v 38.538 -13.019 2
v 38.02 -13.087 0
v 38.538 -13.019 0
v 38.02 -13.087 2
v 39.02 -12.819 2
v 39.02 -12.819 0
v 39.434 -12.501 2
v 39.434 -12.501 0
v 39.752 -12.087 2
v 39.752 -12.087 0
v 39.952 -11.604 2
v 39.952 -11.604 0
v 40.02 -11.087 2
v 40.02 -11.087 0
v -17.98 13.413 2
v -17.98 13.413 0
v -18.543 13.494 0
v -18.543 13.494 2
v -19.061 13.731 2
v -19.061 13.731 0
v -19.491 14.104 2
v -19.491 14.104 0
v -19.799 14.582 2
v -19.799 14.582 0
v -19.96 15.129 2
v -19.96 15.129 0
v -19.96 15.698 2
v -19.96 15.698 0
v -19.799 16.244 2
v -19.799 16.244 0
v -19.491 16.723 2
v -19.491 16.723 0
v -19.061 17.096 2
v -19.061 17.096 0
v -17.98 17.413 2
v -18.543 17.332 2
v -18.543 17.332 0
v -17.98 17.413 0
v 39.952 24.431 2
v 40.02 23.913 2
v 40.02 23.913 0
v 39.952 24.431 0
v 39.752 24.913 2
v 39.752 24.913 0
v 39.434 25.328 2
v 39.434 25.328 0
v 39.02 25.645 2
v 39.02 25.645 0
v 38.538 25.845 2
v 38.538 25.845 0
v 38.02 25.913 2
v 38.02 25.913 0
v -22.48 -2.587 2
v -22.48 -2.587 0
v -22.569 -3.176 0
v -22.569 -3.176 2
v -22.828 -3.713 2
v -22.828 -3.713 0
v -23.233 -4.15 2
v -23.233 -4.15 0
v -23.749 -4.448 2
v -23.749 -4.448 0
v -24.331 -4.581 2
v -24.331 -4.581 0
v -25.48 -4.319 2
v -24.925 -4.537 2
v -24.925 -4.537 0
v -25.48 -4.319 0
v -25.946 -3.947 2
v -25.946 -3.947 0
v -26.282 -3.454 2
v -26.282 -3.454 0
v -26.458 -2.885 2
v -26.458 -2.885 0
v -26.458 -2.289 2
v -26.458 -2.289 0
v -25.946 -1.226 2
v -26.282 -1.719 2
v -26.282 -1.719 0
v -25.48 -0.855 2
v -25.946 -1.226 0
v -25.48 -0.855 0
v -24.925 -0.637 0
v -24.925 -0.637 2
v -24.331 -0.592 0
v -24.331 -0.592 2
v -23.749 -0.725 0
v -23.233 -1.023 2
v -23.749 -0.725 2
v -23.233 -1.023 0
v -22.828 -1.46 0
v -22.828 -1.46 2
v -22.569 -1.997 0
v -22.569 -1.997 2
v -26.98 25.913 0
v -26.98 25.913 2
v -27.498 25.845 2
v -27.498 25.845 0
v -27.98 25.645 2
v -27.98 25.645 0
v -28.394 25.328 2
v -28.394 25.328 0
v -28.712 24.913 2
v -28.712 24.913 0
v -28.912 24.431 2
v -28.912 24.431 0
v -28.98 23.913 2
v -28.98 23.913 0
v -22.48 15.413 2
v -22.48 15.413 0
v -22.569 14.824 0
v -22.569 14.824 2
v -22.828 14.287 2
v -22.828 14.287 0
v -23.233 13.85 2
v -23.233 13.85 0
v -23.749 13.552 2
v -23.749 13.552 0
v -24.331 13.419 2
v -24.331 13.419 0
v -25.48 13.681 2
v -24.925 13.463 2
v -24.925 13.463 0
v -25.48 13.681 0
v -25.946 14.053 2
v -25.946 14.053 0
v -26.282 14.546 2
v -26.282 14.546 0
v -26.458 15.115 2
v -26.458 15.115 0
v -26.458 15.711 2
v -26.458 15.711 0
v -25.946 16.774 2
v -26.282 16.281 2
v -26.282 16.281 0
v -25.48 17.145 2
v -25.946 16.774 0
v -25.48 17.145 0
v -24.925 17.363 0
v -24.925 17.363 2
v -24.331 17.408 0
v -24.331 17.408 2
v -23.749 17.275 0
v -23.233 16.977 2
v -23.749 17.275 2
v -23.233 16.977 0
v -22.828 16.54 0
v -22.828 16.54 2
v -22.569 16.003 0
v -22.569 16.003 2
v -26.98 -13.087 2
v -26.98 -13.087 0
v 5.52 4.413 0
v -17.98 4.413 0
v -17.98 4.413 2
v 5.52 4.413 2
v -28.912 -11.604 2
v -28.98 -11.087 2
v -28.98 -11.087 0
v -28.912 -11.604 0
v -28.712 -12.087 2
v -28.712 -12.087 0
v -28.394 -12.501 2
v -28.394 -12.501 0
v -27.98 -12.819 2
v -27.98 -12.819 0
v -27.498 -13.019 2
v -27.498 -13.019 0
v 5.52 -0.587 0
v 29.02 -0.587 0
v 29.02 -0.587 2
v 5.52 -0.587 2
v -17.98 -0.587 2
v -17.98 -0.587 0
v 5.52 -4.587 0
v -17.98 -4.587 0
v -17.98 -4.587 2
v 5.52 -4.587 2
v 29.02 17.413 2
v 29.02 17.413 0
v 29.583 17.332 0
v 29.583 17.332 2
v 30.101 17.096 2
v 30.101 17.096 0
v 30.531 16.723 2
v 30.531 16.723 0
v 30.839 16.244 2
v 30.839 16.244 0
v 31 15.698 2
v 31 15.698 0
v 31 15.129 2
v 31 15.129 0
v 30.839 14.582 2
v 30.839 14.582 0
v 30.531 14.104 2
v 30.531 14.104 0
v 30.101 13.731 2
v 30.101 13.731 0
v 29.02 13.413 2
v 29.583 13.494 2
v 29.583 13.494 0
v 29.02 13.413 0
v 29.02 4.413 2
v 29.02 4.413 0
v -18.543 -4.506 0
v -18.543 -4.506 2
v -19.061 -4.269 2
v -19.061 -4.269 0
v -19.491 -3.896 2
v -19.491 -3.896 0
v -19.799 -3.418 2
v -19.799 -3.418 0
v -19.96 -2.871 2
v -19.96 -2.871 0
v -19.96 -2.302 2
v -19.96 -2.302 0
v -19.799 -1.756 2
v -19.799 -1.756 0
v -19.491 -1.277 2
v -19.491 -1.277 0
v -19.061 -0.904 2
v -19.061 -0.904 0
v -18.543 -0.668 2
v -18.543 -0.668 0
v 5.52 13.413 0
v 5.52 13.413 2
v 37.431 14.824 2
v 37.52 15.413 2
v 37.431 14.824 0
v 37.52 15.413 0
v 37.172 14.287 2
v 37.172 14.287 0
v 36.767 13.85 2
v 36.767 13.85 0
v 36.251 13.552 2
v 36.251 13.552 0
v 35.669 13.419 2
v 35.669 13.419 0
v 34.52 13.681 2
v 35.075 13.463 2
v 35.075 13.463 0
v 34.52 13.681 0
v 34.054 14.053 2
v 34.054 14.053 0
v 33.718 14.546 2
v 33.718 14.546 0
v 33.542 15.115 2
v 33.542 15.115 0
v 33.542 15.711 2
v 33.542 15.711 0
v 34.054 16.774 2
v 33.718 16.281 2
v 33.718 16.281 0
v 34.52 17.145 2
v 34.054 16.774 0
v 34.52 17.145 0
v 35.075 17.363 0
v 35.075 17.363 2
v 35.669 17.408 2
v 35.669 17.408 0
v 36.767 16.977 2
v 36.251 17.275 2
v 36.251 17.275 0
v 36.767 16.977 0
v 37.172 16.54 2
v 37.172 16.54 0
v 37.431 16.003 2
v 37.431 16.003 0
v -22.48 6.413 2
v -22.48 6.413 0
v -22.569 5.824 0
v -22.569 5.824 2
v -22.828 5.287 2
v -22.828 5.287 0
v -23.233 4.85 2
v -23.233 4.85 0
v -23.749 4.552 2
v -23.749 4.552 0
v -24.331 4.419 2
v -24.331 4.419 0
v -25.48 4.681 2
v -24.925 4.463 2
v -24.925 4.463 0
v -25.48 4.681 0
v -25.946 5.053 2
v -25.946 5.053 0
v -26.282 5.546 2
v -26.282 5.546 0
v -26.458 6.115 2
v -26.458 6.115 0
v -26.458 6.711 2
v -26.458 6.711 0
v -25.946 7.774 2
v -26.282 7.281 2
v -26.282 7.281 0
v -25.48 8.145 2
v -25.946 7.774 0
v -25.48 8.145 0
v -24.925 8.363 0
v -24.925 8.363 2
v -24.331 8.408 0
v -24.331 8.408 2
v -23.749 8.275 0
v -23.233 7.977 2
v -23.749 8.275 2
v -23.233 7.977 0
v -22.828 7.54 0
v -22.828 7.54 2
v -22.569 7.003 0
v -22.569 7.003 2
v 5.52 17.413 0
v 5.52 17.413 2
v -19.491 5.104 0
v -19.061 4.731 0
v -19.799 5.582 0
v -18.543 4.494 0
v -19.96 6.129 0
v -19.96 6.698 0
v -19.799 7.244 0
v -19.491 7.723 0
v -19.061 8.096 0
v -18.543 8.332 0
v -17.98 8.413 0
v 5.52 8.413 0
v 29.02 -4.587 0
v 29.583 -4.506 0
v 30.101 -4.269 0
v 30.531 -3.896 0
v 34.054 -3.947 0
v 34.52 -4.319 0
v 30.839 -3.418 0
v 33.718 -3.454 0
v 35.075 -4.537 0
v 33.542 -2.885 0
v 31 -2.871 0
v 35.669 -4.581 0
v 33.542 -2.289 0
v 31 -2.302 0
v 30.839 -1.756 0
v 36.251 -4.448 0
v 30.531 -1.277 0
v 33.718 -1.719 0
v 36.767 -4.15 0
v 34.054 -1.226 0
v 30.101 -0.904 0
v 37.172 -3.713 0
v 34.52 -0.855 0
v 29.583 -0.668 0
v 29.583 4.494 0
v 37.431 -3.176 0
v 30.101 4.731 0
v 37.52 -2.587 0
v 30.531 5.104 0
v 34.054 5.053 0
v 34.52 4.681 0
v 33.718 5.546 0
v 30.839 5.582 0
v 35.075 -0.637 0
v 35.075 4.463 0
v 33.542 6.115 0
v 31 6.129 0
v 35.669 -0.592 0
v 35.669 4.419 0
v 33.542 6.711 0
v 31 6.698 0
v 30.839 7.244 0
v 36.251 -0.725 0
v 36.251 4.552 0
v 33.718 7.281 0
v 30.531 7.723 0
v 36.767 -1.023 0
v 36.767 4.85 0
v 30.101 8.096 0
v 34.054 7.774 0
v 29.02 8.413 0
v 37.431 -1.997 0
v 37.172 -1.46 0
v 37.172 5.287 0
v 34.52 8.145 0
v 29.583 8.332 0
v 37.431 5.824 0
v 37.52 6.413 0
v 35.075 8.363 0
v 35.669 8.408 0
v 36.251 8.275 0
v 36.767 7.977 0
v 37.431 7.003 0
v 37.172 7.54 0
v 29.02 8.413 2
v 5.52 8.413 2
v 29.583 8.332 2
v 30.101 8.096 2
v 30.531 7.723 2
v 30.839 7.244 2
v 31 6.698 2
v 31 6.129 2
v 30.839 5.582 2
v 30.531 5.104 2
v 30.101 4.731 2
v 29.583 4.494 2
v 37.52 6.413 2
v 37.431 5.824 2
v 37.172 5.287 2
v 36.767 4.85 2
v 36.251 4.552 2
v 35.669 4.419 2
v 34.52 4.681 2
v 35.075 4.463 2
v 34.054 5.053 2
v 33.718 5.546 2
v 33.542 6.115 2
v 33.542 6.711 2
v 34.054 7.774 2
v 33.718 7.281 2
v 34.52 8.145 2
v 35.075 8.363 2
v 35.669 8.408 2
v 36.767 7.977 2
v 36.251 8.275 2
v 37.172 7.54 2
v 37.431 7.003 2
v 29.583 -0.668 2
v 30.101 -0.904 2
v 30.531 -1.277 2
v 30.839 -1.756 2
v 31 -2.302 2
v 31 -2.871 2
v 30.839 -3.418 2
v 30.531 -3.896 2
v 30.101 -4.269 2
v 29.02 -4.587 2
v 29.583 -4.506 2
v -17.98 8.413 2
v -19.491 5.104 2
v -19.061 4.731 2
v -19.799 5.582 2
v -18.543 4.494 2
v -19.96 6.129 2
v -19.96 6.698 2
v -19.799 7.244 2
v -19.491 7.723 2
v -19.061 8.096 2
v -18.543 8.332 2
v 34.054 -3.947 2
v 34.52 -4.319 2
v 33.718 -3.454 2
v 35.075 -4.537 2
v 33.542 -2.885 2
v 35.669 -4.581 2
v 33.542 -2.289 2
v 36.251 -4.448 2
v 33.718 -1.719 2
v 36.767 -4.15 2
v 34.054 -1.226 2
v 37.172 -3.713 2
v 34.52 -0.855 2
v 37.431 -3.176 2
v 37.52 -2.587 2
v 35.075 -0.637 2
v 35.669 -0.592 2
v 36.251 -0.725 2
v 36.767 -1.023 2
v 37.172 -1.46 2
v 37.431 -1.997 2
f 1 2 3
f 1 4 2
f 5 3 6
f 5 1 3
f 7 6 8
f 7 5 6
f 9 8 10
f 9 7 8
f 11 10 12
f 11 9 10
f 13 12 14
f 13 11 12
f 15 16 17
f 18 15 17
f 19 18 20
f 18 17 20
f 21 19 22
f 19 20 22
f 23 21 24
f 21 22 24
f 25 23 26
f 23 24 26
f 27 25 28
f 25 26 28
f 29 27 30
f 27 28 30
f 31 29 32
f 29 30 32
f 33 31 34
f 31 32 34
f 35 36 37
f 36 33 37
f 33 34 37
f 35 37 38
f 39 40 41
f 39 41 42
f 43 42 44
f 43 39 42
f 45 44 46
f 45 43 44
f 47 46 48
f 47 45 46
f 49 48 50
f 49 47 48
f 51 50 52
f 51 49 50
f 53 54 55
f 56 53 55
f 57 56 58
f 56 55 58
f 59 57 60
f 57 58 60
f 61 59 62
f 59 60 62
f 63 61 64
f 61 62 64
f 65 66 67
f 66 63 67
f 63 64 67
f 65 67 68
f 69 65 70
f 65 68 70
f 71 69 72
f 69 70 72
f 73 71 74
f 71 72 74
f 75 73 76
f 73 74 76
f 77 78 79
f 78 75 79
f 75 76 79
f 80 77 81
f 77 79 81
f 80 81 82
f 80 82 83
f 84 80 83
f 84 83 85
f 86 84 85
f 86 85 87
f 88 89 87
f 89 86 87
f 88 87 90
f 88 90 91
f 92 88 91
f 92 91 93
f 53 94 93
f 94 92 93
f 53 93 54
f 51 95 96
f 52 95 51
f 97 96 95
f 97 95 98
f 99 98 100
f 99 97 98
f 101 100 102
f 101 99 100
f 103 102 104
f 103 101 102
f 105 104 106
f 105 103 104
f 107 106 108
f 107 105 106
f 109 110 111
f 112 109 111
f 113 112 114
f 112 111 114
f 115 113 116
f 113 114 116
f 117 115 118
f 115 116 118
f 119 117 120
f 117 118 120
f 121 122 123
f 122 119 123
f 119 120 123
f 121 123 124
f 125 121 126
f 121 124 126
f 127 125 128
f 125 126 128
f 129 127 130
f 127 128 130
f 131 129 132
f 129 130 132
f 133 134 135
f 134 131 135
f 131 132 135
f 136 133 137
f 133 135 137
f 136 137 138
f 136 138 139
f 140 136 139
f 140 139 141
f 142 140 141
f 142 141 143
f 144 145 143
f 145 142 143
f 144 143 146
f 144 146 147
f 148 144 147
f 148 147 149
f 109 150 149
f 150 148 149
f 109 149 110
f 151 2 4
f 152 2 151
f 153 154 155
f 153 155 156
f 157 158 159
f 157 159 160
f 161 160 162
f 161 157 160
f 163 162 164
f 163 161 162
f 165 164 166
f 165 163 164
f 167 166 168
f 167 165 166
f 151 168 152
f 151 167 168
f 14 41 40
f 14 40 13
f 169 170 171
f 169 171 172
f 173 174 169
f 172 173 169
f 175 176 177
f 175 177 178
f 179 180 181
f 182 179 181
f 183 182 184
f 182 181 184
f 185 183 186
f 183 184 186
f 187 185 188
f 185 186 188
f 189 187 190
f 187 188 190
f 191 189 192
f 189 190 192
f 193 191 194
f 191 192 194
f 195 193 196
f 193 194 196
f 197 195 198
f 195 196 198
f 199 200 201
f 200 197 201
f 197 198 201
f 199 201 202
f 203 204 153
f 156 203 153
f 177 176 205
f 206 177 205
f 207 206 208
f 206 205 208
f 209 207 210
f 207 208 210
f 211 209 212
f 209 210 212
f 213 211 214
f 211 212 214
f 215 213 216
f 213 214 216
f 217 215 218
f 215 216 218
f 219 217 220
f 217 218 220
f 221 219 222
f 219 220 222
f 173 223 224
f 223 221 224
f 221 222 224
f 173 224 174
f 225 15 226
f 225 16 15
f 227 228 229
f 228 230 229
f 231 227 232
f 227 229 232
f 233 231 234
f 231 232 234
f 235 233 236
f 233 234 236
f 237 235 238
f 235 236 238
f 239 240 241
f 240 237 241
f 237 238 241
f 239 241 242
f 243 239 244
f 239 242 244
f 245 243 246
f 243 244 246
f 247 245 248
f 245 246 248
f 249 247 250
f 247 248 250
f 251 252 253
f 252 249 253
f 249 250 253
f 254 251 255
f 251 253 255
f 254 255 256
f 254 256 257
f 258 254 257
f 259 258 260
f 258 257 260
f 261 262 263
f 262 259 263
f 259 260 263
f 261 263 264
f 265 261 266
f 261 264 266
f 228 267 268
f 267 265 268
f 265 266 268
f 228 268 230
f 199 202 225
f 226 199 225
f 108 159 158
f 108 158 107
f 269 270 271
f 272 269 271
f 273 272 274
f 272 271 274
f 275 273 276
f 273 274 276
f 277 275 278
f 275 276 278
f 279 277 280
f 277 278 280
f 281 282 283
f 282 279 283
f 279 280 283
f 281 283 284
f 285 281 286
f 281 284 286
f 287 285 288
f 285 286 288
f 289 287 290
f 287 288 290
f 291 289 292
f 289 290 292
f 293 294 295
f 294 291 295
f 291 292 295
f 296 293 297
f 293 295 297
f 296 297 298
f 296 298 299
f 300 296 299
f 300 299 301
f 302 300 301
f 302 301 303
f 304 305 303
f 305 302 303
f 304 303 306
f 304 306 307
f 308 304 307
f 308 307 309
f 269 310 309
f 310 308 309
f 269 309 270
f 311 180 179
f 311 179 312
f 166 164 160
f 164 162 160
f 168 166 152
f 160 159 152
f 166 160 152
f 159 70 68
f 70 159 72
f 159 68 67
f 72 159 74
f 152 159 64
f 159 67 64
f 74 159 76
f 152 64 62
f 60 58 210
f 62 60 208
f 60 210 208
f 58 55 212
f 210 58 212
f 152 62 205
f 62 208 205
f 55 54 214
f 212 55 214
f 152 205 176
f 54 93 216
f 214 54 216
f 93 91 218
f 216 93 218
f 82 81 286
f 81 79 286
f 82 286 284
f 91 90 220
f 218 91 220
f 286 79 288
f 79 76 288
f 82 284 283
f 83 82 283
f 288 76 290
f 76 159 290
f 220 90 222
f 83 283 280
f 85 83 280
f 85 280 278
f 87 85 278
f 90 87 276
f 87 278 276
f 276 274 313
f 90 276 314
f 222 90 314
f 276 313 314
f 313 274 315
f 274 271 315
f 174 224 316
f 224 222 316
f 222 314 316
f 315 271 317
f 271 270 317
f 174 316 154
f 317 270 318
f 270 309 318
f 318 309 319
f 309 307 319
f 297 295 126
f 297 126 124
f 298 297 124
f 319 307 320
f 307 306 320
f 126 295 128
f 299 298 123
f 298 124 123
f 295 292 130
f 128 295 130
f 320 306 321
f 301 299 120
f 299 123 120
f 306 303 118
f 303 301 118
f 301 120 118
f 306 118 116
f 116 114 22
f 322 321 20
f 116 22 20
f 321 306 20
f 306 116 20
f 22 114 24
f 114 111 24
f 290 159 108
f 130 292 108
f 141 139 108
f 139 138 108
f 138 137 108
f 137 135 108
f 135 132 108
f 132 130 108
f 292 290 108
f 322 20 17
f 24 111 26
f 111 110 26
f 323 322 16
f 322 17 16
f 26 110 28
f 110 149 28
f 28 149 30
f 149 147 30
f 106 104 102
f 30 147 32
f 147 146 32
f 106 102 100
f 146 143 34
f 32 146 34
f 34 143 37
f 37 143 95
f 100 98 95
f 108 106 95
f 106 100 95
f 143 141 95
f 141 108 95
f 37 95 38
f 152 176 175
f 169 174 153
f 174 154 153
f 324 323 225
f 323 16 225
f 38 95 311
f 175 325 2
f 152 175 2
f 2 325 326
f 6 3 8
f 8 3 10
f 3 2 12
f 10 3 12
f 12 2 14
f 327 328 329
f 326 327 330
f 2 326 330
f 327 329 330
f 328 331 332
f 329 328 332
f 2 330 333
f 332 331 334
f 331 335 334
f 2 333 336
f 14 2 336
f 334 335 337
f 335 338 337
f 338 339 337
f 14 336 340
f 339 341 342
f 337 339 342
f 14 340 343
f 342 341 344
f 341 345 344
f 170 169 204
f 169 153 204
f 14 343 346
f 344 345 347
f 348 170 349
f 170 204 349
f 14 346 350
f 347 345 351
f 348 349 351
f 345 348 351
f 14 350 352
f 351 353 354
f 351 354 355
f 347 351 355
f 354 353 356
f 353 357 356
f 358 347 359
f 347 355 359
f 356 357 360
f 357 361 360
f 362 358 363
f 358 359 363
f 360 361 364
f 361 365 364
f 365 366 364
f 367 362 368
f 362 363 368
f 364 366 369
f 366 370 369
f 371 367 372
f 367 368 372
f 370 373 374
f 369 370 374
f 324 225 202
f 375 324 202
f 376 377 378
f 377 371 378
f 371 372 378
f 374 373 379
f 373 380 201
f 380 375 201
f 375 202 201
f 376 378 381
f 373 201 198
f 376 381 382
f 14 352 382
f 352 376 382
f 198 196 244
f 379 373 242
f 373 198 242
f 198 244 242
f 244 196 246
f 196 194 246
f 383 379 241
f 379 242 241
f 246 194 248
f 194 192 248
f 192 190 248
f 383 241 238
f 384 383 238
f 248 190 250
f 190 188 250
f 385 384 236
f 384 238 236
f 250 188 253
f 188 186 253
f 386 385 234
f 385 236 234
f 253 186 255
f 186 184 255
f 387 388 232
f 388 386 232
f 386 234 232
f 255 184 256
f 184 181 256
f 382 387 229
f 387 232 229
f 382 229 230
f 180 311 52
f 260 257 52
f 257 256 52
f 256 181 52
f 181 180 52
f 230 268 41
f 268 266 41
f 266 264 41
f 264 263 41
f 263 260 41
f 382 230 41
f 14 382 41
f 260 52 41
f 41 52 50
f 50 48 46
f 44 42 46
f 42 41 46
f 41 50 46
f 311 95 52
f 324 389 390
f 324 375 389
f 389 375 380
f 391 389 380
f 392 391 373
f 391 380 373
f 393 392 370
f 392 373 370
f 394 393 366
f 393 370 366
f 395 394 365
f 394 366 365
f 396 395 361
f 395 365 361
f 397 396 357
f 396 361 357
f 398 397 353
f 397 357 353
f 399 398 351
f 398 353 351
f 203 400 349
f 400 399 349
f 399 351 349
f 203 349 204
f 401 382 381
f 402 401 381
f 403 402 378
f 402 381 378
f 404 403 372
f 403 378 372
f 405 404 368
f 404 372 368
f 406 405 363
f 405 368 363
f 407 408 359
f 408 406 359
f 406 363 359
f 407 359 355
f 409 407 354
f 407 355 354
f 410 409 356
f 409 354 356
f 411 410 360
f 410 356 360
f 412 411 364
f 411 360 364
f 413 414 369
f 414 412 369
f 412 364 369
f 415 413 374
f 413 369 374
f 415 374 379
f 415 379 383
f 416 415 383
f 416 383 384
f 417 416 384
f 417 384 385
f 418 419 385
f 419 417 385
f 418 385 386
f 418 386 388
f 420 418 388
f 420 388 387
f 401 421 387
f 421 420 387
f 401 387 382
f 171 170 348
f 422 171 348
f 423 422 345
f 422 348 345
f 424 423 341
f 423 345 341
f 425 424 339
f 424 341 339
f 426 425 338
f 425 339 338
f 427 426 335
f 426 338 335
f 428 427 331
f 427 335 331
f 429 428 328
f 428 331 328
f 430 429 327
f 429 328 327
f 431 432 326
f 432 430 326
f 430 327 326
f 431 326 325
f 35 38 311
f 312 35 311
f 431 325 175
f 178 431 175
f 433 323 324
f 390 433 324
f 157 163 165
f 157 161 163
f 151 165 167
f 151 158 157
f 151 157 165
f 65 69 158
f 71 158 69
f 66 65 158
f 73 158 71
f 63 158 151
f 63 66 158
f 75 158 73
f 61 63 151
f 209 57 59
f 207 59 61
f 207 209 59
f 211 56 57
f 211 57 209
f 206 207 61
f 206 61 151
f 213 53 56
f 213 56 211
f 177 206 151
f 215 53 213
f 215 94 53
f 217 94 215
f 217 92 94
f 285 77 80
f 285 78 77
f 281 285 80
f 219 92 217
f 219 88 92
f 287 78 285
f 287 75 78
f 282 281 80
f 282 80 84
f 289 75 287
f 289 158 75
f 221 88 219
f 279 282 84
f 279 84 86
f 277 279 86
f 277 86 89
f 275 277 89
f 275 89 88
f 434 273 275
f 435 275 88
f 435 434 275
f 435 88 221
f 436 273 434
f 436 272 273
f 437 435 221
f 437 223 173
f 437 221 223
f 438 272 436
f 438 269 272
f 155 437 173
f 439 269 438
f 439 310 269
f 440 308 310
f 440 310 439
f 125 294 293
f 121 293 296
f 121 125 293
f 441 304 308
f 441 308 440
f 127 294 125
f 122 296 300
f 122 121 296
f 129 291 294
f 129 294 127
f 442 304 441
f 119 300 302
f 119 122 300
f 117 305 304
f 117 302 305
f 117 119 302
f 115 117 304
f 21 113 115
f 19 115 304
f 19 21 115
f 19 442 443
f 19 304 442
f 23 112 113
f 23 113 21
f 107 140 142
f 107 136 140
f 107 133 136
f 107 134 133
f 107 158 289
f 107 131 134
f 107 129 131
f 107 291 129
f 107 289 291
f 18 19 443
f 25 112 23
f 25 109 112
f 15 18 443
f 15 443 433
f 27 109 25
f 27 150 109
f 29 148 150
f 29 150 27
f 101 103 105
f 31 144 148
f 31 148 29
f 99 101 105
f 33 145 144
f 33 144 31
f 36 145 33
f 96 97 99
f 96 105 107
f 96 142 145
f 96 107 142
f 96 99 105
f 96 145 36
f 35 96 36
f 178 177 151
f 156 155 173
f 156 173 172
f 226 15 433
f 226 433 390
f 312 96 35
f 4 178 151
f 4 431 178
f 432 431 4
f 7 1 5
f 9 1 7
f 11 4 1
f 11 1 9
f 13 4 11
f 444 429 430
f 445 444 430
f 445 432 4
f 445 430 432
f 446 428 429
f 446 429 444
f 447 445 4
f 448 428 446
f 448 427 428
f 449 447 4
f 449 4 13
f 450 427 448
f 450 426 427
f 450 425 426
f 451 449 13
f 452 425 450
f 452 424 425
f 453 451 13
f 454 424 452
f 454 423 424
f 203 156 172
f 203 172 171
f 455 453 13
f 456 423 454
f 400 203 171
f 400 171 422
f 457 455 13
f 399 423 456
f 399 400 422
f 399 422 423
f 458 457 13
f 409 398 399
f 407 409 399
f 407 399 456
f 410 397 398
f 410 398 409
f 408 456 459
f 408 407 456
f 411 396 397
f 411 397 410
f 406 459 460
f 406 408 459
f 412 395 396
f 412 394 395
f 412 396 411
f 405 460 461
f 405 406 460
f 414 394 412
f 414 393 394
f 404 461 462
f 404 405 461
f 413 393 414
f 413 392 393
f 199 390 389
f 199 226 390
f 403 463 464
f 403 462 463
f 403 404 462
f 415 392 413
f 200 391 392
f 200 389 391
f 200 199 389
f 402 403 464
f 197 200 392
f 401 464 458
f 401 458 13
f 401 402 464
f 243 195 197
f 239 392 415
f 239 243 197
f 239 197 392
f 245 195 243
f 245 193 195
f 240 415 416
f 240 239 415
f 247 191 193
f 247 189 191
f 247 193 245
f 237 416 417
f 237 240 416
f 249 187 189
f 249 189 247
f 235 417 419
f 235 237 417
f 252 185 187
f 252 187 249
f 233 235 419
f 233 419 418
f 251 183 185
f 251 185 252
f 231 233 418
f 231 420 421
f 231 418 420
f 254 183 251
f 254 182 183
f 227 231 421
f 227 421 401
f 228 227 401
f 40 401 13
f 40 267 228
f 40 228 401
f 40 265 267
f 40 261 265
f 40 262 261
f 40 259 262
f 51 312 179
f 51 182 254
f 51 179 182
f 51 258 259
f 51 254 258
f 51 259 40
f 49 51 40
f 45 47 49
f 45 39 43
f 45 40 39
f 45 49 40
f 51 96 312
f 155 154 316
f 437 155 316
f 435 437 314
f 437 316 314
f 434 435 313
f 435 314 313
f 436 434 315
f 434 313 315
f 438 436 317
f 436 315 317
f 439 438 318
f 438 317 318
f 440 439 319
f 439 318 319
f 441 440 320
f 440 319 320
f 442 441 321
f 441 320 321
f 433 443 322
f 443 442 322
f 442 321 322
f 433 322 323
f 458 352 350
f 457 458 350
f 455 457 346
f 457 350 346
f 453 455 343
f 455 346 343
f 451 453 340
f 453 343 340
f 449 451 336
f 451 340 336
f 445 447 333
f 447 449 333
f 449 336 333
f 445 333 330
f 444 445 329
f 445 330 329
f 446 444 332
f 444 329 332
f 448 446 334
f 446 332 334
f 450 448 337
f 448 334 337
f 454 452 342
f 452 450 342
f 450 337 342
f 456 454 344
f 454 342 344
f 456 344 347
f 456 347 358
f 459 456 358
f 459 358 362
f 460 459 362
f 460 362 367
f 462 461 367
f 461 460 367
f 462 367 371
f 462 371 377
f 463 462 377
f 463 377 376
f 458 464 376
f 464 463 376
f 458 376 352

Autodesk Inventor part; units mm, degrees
ref_plane "YZ Plane" through (0, 0, 0) normal (1, 0, 0) x (0, 1, 0)
ref_plane "XZ Plane" through (0, 0, 0) normal (0, 1, 0) x (-1, 0, 0)
ref_plane "XY Plane" through (0, 0, 0) normal (0, 0, 1) x (1, 0, 0)
sketch "Эскиз1" plane through (0, 0, 0) normal (0, 0, 1) x (1, 0, 0)
  line L0 (-28.98, 25.9133) -> (40.02, 25.9133)
  line L1 (40.02, 25.9133) -> (40.02, -13.0867)
  line L2 (40.02, -13.0867) -> (-28.98, -13.0867)
  line L3 (-28.98, -13.0867) -> (-28.98, 25.9133)
  arc A0 (-17.98, 8.4133) -> (-17.98, 4.4133) centre (-17.98, 6.4133) ccw
  line L4 (-17.98, 8.4133) -> (5.52, 8.4133)
  line L5 (-17.98, 4.4133) -> (5.52, 4.4133)
  arc A1 (-17.98, 17.4133) -> (-17.98, 13.4133) centre (-17.98, 15.4133) ccw
  line L6 (-17.98, 17.4133) -> (5.52, 17.4133)
  line L7 (-17.98, 13.4133) -> (5.52, 13.4133)
  circle A2 centre (-24.48, 15.4133) radius 2
  circle A3 centre (-24.48, 6.4133) radius 2
  arc A4 (-17.98, -0.5867) -> (-17.98, -4.5867) centre (-17.98, -2.5867) ccw
  line L8 (-17.98, -4.5867) -> (5.52, -4.5867)
  line L9 (-17.98, -0.5867) -> (5.52, -0.5867)
  circle A5 centre (-24.48, -2.5867) radius 2
  arc A6 (29.02, 4.4133) -> (29.02, 8.4133) centre (29.02, 6.4133) ccw
  line L10 (29.02, 8.4133) -> (5.52, 8.4133)
  line L11 (29.02, 4.4133) -> (5.52, 4.4133)
  arc A7 (29.02, 13.4133) -> (29.02, 17.4133) centre (29.02, 15.4133) ccw
  line L12 (29.02, 17.4133) -> (5.52, 17.4133)
  line L13 (29.02, 13.4133) -> (5.52, 13.4133)
  circle A8 centre (35.52, 15.4133) radius 2
  circle A9 centre (35.52, 6.4133) radius 2
  circle A10 centre (35.52, -2.5867) radius 2
  line L14 (29.02, -4.5867) -> (5.52, -4.5867)
  arc A11 (29.02, -4.5867) -> (29.02, -0.5867) centre (29.02, -2.5867) ccw
  line L15 (29.02, -0.5867) -> (5.52, -0.5867)
  point P0 (0, 0)
  dimension "d0" = 69
  dimension "d1" = 39
  dimension "d3" = 4
  dimension "d8" = 4
  dimension "d9" = 4
extrude "Выдавливание1" add sketch "Эскиз1" along normal blind 2
fillet "Сопряжение1" radius 2 4 edges at (-28.98, 25.9133, 1) (40.02, 25.9133, 1) (40.02, -13.0867, 1) (-28.98, -13.0867, 1)
properties part number "радиатор"
